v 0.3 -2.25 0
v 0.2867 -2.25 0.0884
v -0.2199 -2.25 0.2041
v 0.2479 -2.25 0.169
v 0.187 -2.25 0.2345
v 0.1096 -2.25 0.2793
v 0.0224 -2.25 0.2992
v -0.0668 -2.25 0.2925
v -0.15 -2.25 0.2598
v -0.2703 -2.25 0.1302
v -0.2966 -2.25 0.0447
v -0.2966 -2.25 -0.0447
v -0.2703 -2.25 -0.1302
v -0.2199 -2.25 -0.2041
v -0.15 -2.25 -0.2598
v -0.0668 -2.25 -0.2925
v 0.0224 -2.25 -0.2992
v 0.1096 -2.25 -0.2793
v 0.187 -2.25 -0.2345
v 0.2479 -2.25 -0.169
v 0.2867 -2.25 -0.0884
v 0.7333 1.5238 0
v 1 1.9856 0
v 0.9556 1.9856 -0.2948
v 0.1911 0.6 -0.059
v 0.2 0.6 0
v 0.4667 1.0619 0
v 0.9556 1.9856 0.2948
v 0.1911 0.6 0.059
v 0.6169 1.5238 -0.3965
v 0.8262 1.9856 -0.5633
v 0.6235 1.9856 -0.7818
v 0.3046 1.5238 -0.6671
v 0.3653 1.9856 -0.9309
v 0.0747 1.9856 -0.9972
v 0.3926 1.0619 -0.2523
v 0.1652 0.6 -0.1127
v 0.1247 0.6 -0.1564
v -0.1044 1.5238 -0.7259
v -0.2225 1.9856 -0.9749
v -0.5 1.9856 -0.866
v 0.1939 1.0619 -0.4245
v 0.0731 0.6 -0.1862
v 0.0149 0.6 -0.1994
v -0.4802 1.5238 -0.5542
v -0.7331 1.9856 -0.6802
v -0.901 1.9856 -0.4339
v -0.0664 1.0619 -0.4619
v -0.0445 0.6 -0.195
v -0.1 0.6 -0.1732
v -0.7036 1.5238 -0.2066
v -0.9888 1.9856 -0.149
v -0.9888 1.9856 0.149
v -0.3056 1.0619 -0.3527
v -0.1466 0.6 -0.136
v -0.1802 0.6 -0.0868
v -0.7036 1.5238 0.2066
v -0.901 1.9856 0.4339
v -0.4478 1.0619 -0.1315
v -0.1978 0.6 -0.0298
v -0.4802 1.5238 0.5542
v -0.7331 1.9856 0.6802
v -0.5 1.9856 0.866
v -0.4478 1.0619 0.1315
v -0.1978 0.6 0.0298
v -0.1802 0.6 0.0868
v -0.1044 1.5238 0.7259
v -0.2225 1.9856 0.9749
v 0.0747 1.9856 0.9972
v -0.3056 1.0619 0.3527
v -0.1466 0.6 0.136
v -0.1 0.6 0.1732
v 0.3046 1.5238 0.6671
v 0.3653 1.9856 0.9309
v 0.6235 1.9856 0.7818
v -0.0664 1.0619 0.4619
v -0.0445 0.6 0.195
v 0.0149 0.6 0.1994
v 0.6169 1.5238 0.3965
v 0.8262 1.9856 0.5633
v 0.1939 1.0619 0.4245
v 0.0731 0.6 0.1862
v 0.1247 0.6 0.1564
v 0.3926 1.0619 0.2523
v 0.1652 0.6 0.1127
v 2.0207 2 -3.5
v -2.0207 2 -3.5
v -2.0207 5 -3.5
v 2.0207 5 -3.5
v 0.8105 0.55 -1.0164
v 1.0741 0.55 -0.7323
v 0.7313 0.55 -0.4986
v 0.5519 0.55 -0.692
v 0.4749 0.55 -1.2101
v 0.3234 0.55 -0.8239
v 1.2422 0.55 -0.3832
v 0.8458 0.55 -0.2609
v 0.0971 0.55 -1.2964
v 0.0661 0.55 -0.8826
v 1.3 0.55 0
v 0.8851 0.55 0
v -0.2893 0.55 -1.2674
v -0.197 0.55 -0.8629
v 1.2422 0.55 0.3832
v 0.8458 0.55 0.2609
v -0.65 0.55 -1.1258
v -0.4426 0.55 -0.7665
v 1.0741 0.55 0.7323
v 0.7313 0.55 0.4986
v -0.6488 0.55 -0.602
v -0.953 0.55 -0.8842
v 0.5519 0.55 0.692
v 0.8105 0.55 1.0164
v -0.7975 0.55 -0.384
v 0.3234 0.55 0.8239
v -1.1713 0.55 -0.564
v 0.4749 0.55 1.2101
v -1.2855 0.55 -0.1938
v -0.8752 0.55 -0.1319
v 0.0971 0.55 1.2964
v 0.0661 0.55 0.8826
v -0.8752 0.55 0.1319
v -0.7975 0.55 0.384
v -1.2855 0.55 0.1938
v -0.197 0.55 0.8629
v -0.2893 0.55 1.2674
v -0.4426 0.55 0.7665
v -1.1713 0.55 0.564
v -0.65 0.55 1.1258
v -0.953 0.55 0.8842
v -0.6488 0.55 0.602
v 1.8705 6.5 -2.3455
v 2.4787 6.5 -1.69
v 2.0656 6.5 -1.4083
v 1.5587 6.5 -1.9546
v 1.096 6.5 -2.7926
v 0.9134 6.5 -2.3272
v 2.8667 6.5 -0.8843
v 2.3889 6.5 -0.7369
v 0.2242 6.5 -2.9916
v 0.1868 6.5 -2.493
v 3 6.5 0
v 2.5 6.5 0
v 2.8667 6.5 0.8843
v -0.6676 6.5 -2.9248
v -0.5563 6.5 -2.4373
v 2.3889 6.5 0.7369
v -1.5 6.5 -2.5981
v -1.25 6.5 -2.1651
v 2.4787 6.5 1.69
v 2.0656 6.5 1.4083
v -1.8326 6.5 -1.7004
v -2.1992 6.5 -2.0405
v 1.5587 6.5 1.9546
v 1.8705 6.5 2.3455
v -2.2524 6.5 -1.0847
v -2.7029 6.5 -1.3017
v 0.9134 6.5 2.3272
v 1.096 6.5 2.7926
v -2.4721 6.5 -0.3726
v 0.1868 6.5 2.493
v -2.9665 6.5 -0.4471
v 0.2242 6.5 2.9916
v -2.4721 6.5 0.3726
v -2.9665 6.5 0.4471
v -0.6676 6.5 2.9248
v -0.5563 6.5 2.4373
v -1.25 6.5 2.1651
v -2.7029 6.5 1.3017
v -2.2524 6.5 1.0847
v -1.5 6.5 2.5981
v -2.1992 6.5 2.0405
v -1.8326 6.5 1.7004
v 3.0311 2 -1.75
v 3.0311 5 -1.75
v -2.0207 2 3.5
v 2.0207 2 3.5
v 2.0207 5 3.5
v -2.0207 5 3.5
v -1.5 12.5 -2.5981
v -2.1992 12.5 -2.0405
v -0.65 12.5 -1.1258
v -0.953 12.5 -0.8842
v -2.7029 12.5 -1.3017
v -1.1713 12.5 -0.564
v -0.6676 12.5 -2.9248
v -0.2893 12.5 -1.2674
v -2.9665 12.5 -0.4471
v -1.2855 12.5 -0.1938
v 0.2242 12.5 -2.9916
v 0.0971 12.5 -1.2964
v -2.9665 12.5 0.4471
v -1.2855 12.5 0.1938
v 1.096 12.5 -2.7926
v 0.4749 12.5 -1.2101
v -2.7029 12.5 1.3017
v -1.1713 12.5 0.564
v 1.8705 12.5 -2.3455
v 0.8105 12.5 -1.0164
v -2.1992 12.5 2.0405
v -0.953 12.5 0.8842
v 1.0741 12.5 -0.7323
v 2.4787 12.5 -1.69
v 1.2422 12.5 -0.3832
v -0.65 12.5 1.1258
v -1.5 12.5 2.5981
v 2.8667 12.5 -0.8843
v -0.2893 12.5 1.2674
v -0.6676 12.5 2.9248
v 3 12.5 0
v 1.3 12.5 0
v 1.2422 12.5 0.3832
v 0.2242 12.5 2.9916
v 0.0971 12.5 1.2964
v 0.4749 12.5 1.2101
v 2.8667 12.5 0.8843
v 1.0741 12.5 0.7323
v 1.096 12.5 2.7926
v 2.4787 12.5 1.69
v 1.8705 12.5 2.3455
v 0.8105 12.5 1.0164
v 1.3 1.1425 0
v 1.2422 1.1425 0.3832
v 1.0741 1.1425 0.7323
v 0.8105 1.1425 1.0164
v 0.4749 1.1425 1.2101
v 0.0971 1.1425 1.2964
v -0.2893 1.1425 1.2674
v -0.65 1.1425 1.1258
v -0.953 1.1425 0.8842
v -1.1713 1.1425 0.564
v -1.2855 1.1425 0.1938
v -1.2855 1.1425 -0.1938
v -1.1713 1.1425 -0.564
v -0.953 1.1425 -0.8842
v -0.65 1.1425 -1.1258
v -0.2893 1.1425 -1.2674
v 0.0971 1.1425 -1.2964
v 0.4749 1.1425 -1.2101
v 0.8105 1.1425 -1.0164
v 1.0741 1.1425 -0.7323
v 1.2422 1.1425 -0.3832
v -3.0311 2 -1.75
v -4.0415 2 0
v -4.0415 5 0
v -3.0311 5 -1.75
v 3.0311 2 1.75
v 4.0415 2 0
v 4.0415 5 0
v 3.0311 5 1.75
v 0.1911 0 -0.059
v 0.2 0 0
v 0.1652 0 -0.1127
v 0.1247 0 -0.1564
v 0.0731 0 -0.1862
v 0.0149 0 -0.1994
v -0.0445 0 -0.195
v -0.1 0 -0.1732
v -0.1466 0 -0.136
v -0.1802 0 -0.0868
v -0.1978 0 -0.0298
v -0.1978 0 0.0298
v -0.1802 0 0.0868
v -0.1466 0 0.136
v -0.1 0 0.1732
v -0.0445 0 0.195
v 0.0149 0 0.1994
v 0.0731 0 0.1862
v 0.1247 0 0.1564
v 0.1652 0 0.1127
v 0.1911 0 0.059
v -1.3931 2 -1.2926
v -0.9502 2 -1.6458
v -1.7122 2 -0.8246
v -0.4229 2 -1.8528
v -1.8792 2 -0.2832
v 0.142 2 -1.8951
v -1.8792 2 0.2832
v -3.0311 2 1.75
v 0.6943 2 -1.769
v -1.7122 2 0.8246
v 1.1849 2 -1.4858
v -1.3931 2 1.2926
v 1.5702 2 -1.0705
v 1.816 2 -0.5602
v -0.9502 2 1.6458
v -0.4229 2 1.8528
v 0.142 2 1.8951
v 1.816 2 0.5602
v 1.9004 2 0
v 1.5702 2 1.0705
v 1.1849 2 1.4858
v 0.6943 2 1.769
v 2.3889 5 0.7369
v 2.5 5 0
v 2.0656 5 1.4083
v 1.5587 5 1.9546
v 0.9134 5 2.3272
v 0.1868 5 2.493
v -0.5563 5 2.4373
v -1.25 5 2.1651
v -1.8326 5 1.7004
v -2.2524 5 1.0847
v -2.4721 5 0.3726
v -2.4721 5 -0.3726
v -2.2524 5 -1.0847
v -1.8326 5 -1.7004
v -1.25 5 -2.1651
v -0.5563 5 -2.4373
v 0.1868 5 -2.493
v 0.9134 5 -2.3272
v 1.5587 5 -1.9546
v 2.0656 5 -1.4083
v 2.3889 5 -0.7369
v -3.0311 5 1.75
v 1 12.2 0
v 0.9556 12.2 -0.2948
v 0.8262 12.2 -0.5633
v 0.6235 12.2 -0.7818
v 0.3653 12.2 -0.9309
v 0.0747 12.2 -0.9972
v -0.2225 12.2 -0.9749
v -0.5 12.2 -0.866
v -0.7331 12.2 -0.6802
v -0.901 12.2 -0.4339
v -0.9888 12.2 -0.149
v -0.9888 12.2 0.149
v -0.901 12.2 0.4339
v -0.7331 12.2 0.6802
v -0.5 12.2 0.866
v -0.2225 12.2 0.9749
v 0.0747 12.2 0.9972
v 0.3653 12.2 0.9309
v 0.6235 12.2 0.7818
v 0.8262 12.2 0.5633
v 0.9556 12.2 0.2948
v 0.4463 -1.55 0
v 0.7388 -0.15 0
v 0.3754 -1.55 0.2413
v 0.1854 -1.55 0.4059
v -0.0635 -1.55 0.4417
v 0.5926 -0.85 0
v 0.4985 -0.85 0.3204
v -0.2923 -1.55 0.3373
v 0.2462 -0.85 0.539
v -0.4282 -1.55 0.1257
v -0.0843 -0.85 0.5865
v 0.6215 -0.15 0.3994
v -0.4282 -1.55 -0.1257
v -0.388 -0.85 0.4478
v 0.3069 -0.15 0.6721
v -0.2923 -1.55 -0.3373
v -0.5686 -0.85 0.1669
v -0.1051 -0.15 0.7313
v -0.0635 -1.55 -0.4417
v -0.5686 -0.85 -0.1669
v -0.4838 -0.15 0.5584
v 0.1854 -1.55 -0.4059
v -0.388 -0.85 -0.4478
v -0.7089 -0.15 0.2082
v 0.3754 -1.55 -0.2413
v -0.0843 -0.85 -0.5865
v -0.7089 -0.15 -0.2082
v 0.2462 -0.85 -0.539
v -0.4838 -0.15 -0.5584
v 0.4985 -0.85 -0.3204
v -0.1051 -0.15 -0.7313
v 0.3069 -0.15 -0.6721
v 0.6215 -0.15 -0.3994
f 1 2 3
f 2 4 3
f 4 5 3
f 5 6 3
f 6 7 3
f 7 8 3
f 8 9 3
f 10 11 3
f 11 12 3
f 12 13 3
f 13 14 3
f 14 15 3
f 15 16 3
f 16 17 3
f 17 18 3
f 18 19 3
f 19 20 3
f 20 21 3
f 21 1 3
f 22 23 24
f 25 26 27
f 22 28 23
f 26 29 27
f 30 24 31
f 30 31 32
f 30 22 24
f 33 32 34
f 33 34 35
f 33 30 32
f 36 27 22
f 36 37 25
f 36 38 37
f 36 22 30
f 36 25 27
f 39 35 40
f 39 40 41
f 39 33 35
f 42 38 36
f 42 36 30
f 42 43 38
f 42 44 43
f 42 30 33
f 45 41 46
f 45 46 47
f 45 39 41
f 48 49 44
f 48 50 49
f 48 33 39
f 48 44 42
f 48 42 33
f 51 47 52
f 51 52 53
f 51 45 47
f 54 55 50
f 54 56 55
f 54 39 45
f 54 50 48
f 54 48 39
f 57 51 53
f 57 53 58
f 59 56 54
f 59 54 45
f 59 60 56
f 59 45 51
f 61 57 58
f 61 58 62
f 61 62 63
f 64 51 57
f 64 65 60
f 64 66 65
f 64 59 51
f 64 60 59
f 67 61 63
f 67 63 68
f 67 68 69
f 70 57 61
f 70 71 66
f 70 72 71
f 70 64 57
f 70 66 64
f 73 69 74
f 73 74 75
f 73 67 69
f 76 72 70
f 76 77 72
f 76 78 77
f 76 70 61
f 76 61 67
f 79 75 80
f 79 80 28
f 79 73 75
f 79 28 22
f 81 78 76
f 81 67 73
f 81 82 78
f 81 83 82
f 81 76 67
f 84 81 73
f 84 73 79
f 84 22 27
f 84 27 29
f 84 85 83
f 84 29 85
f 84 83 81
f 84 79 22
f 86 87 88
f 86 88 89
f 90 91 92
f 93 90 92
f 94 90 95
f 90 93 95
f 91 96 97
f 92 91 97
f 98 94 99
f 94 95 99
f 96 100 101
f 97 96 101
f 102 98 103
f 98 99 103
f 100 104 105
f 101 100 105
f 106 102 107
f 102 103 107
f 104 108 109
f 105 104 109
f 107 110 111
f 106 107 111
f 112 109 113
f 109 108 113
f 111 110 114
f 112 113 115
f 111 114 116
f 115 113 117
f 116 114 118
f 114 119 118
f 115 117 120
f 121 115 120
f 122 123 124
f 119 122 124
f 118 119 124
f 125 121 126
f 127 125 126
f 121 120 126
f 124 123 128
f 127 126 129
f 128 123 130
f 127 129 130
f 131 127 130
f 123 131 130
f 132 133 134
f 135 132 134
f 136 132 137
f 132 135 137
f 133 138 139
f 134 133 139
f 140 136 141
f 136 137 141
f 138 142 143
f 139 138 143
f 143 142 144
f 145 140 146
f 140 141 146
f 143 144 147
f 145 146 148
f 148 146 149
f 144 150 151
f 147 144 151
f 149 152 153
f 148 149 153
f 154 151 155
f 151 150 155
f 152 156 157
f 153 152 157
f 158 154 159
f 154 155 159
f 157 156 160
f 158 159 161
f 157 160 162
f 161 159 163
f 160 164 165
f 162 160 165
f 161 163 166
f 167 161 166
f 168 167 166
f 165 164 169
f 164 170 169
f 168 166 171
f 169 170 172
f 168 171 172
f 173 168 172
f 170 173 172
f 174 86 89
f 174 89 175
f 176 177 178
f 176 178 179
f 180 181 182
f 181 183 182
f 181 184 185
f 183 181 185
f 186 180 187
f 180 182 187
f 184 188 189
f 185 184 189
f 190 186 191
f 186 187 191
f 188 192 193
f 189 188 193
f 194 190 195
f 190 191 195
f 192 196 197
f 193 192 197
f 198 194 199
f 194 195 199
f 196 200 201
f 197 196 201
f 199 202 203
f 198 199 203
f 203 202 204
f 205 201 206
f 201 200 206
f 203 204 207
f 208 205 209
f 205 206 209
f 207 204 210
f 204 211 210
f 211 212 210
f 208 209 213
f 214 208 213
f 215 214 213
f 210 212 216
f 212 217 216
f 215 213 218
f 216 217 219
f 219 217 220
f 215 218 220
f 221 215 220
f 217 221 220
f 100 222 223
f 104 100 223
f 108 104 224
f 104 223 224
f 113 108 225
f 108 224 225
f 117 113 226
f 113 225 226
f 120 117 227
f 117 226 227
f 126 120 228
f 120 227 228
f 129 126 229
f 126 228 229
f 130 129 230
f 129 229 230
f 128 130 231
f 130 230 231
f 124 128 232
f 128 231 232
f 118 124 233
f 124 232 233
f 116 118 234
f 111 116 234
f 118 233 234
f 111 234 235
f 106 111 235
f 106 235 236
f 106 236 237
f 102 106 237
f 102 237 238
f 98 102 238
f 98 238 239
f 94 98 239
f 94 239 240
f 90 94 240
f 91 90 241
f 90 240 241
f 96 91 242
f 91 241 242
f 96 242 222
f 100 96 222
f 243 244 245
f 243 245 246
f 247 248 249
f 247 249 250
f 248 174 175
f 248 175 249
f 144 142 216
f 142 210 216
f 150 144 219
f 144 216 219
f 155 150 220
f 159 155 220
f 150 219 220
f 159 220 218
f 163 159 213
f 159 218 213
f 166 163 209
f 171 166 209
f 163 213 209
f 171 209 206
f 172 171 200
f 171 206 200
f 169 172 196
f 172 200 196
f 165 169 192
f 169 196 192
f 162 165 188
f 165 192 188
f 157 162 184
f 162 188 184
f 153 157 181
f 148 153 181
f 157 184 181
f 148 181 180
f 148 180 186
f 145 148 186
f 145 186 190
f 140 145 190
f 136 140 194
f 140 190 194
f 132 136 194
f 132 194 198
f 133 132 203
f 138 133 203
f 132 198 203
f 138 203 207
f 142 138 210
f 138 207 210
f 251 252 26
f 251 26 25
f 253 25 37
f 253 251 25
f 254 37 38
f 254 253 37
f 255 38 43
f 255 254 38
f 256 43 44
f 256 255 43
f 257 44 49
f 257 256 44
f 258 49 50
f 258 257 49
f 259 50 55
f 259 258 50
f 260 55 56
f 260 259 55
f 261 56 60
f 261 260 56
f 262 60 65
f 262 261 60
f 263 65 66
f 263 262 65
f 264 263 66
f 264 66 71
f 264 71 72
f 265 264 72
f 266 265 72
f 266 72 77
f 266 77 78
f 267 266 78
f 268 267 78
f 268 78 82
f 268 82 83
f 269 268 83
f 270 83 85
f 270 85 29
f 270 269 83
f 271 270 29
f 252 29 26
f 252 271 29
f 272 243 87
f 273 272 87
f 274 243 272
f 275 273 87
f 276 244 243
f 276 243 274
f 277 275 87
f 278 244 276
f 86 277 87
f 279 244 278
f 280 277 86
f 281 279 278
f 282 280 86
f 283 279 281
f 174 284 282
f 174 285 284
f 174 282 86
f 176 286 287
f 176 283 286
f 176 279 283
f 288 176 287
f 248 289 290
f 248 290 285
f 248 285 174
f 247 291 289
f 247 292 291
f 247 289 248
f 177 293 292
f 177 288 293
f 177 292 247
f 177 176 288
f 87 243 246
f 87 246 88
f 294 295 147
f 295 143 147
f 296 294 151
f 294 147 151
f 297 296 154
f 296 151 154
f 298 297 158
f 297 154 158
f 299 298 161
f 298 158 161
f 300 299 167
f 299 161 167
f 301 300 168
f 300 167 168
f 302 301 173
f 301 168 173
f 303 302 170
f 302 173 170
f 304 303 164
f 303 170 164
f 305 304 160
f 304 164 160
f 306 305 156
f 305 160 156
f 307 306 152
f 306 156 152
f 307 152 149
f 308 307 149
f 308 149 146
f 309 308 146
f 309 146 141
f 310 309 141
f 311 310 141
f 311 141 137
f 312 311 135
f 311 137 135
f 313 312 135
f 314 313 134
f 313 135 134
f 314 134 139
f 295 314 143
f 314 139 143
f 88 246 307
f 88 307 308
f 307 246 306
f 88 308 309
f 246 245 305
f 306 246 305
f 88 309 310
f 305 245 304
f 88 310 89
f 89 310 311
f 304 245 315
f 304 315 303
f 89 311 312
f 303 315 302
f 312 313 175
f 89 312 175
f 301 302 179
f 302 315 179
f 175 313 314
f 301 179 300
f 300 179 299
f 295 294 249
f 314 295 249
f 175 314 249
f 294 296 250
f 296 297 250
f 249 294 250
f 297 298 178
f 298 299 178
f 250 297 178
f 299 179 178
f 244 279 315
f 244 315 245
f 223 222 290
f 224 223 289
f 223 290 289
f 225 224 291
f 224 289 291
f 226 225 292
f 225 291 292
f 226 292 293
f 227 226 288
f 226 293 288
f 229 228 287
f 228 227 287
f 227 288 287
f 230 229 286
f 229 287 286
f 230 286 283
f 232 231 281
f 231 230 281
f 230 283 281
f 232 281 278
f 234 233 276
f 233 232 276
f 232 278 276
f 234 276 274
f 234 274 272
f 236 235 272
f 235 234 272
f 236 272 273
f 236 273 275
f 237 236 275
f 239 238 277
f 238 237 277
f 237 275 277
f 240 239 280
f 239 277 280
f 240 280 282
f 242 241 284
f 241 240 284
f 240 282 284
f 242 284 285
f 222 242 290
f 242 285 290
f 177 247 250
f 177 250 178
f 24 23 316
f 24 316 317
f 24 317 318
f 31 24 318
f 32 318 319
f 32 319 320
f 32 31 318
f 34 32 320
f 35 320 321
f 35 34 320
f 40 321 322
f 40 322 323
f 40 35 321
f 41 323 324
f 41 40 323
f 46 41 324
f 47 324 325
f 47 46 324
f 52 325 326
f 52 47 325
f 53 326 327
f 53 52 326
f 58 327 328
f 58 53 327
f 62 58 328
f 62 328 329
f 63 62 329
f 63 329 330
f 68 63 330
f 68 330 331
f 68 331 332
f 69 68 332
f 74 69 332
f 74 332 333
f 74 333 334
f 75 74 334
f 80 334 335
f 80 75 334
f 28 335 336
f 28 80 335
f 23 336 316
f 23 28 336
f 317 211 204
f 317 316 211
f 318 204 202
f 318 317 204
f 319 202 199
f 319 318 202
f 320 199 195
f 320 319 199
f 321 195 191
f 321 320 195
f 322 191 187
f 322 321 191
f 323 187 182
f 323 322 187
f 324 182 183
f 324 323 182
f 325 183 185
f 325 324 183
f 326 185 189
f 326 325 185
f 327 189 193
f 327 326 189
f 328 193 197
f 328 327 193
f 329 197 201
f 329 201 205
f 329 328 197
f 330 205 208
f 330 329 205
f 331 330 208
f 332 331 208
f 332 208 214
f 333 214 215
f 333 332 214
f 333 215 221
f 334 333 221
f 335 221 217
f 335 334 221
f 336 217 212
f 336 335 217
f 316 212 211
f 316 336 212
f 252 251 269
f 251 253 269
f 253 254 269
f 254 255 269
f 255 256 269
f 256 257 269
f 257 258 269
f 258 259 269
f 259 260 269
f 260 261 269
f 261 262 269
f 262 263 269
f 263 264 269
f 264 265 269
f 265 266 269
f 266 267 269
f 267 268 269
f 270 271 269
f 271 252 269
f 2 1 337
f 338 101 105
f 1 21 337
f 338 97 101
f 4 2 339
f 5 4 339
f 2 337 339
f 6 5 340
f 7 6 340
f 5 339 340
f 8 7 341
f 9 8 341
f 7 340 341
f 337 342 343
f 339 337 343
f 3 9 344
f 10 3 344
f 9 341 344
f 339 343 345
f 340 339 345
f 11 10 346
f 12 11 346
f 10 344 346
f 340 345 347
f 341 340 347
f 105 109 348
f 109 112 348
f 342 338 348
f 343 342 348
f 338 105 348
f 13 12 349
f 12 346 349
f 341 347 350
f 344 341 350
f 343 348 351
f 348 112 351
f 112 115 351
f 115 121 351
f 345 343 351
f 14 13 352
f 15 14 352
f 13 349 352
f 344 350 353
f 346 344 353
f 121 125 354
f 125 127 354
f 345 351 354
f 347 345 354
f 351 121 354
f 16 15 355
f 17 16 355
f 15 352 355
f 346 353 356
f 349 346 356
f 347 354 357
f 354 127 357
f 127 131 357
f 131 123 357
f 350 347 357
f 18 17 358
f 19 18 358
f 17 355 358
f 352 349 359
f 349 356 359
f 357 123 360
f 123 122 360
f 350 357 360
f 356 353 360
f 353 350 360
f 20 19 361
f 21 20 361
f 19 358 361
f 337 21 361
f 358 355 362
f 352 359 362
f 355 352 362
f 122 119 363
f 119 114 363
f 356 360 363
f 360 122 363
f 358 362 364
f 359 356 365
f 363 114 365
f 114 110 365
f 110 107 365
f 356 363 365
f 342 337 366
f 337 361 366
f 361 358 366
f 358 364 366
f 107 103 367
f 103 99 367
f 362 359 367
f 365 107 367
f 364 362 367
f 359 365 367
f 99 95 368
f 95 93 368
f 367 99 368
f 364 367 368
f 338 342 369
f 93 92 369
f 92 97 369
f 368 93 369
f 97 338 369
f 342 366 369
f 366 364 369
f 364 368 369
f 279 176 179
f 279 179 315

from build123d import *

# Parameters (mm, degrees)
BOSS_EXTRUDE1_DEPTH = 3


with BuildPart() as part:
    # Sketch1 → Revolve1 (revolve)
    with BuildSketch(Plane.XY):
        Polygon((0, 0), (0.5, 0), (1.900415076, 2), (3.5, 2), (3.5, 5), (2.5, 5), (2.5, 6.5), (3, 6.5), (3, 12.5), (0, 12.5), align=None)
    revolve(axis=Axis((0, -1.1291331, 0), (0, -1, 0)))

    # Sketch2 → Cut-Revolve1 (revolve, cut)
    with BuildSketch(Plane.XY):
        Polygon((0, 12.5), (1.3, 12.5), (1, 12.2), (1, 1.985640646), (0.2, 0.6), (0.2, 0), (0, 0), align=None)
    revolve(axis=Axis((0, 0, 0), (0, 1, 0)), mode=Mode.SUBTRACT)

    # Sketch3 → Boss-Extrude1 (add)
    with BuildSketch(Plane.XZ.offset(-2)):
        with BuildLine():
            ThreePointArc((-3.031088921, -1.749999986), (-3.5, 0), (-3.031088921, 1.749999986))
            Line((-3.031088921, 1.749999986), (-4.041451884, 0))
            Line((-4.041451884, 0), (-3.031088921, -1.749999986))
        make_face()
        with BuildLine():
            ThreePointArc((-3.031088921, 1.749999986), (-1.750000007, 3.031088909), (0, 3.5))
            Line((0, 3.5), (-2.020725942, 3.5))
            Line((-2.020725942, 3.5), (-3.031088921, 1.749999986))
        make_face()
        with BuildLine():
            ThreePointArc((0, 3.5), (1.750000007, 3.031088909), (3.031088922, 1.749999985))
            Line((3.031088922, 1.749999985), (2.020725942, 3.5))
            Line((2.020725942, 3.5), (0, 3.5))
        make_face()
        with BuildLine():
            Line((2.020725942, -3.5), (3.031088915, -1.749999996))
            ThreePointArc((3.031088915, -1.749999996), (1.750000009, -3.031088908), (1.6e-08, -3.5))
            Line((1.6e-08, -3.5), (2.020725942, -3.5))
        make_face()
        with BuildLine():
            Line((-2.020725942, -3.5), (1.6e-08, -3.5))
            ThreePointArc((1.6e-08, -3.5), (-1.75, -3.031088913), (-3.031088921, -1.749999986))
            Line((-3.031088921, -1.749999986), (-2.020725942, -3.5))
        make_face()
        with BuildLine():
            Line((3.031088915, -1.749999996), (4.041451884, 0))
            Line((4.041451884, 0), (3.031088922, 1.749999985))
            ThreePointArc((3.031088922, 1.749999985), (3.380740394, 0.90586665), (3.5, 0))
            ThreePointArc((3.5, 0), (3.380740393, -0.905866656), (3.031088915, -1.749999996))
        make_face()
    extrude(amount=-BOSS_EXTRUDE1_DEPTH)

    # Sketch4 → Revolve2 (revolve)
    with BuildSketch(Plane.XY):
        Polygon((0, 0), (0, -2.25), (0.3, -2.25), (0.885114146, 0.55), (1.3, 0.55), (1.3, 2), (1.008290377, 2), (1, 1.985640646), (0.2, 0.6), (0.2, 0), align=None)
    revolve(axis=Axis((0, 2, 0), (0, -1, 0)))


solid = part.part
